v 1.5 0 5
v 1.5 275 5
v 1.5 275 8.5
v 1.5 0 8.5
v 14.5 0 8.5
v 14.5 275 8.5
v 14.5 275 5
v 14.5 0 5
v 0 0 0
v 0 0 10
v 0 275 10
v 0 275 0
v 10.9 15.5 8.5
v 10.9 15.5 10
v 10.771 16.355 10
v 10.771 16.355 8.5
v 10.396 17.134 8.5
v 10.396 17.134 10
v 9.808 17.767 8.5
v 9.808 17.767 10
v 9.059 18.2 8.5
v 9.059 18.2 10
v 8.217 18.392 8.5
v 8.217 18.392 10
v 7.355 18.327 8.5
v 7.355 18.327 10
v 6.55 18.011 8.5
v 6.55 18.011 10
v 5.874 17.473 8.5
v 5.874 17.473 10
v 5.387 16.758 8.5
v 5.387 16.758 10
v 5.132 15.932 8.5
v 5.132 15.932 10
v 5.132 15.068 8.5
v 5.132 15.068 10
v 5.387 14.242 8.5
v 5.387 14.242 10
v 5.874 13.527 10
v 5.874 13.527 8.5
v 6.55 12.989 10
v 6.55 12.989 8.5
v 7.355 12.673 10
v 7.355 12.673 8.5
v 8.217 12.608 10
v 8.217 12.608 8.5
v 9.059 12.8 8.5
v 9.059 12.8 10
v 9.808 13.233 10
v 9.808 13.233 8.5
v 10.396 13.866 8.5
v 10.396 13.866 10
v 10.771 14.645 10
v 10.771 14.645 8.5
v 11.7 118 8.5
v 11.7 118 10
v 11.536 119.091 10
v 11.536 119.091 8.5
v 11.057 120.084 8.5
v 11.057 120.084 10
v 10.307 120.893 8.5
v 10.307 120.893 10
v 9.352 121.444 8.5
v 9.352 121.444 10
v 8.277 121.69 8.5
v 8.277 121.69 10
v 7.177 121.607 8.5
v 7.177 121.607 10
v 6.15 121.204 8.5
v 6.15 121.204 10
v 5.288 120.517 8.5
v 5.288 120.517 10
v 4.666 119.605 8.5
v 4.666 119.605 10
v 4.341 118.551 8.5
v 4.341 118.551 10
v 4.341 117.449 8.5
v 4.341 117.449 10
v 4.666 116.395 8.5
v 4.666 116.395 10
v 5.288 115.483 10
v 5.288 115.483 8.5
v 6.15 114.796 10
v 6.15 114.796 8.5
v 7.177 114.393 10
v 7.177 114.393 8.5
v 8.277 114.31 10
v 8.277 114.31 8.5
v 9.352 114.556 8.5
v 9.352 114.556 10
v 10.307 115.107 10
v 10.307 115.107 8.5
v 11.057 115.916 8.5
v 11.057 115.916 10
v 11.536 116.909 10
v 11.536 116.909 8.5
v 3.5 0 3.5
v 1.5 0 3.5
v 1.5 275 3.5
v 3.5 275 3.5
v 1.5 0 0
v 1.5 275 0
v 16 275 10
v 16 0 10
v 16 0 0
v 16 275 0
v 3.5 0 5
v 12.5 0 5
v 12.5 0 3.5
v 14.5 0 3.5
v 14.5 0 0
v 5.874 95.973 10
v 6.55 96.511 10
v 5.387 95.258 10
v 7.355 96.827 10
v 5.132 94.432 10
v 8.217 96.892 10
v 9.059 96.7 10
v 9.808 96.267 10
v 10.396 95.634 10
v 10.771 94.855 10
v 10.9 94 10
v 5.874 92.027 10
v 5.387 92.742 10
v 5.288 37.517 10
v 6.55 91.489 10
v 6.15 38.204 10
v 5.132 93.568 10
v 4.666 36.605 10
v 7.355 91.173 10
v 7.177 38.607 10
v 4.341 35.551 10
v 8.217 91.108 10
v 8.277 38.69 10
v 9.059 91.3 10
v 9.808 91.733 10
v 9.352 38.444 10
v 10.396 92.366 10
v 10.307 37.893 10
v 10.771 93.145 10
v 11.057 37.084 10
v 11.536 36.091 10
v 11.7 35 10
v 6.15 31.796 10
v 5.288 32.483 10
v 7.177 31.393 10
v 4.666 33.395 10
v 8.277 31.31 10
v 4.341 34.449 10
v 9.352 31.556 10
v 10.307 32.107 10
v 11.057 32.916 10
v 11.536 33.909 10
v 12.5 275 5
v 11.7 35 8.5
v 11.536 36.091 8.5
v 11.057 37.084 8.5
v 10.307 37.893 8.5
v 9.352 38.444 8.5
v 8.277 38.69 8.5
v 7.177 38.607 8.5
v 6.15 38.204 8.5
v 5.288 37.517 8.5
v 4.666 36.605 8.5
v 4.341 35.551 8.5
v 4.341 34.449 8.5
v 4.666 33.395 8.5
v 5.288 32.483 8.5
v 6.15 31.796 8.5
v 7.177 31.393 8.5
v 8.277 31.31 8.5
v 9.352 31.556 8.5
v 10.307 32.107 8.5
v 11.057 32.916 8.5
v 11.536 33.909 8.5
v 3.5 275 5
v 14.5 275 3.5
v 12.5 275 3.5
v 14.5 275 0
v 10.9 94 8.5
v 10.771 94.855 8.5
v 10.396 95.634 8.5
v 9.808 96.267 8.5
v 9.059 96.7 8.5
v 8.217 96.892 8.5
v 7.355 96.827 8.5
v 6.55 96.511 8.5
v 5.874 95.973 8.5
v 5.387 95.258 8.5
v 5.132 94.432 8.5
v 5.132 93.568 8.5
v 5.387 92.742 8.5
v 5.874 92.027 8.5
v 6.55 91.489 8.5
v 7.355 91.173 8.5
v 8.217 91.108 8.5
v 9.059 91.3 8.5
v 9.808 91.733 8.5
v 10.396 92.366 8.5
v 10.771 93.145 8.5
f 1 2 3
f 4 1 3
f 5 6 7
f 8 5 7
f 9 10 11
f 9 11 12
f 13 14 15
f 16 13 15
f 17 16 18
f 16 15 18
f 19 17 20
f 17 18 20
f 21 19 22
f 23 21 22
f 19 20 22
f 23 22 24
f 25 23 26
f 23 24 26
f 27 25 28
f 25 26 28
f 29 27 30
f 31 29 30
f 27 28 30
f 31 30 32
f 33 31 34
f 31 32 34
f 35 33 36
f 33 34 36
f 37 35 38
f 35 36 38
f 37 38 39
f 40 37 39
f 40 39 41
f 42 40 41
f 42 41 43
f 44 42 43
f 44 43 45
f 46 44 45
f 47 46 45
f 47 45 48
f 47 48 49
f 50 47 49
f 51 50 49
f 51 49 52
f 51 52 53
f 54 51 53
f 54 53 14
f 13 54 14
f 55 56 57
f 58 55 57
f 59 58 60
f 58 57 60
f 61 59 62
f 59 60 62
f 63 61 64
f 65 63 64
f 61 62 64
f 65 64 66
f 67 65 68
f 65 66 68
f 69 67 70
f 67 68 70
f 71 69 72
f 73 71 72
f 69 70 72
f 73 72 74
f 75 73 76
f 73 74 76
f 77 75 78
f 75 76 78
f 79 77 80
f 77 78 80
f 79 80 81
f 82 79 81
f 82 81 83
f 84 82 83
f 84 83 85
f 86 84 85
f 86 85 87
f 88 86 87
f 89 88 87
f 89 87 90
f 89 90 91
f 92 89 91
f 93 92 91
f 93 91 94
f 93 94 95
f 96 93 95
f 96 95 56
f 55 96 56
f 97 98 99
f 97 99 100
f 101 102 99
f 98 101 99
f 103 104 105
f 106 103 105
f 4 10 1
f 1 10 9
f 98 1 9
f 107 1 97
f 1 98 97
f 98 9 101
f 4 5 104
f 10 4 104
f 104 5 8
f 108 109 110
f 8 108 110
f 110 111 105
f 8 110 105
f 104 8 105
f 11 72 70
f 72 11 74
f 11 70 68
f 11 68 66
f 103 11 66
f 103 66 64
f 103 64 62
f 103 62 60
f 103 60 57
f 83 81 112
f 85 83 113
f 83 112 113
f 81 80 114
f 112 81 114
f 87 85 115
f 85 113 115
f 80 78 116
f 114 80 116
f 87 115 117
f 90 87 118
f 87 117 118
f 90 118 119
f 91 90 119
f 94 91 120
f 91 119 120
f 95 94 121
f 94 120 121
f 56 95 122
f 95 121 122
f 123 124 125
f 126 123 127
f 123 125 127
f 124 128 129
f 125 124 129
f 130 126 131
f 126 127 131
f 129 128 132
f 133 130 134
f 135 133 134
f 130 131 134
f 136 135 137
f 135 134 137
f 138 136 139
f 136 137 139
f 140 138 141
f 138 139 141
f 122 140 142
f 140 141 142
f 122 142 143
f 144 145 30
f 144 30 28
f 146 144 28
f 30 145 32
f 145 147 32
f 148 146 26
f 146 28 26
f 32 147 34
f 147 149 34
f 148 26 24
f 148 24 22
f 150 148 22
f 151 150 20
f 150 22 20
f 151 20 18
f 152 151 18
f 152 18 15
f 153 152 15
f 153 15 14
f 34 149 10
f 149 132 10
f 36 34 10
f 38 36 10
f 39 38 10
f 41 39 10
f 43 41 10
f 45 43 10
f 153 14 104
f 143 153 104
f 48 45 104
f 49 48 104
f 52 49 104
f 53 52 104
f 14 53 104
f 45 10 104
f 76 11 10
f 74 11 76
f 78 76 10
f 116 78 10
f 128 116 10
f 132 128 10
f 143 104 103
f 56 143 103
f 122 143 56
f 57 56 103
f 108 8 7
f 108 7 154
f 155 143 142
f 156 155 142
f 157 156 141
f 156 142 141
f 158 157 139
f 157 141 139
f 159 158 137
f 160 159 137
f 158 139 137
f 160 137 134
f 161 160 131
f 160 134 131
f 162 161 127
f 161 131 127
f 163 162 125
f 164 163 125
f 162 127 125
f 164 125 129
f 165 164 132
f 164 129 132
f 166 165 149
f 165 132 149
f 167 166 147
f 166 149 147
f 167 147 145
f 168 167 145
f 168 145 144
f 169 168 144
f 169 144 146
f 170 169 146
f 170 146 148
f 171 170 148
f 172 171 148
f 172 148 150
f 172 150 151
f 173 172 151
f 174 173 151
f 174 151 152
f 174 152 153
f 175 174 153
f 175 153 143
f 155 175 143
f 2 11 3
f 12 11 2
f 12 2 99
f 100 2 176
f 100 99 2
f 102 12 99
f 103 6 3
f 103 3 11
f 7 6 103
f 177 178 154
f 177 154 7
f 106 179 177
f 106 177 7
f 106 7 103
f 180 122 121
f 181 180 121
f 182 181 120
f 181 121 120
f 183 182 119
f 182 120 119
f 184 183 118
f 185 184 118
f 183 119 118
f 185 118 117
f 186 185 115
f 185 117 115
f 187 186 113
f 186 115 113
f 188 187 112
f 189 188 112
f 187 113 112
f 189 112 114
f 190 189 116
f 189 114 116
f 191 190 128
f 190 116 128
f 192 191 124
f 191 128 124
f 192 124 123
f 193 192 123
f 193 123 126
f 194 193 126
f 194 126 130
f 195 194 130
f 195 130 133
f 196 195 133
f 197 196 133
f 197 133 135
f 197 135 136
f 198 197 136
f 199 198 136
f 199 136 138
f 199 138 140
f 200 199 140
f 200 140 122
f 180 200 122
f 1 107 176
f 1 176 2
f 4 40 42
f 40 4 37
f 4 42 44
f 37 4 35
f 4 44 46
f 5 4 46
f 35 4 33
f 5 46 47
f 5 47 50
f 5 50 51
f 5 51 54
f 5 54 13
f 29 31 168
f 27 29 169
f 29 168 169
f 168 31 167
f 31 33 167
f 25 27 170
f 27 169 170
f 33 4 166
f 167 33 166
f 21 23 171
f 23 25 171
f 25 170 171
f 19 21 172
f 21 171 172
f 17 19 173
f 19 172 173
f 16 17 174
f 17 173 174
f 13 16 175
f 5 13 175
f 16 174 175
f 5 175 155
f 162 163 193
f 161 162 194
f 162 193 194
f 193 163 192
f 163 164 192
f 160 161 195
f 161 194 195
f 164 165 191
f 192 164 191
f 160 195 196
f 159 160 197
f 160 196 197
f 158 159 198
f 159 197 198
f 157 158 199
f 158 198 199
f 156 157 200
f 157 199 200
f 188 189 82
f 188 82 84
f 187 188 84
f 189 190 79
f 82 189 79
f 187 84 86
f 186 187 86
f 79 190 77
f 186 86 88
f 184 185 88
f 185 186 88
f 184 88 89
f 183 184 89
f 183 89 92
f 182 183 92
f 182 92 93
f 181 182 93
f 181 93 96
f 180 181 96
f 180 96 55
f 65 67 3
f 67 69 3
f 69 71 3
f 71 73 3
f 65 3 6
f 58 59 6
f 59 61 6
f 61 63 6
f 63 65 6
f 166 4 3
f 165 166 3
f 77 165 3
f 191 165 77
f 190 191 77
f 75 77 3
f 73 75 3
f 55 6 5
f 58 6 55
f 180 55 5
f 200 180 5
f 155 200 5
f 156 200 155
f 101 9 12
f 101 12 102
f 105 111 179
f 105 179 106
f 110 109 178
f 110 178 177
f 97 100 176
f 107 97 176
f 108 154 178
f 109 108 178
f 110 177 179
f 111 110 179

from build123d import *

# Parameters (mm, degrees)
SKETCH1_W           = 16
SKETCH1_H           = 10
BOSS_EXTRUDE1_DEPTH = 275
CUT_EXTRUDE1_DEPTH  = 275
SKETCH3_R           = 2.9
SKETCH3_R_2         = 3.7
CUT_EXTRUDE2_DEPTH  = 276.646512766


with BuildPart() as part:
    # Sketch1 → Boss-Extrude1 (new body)
    with BuildSketch(Plane(origin=(0, 0, 0), x_dir=(1, 0, 0), z_dir=(0, 1, 0))):
        with Locations((8, -5)):
            Rectangle(SKETCH1_W, SKETCH1_H)
    extrude(amount=BOSS_EXTRUDE1_DEPTH)

    # Sketch2 → Cut-Extrude1 (cut)
    with BuildSketch(Plane(origin=(0, 275, 0), x_dir=(1, 0, 0), z_dir=(0, 1, 0))):
        Polygon((1.5, 0), (1.5, -3.5), (3.5, -3.5), (3.5, -5), (1.5, -5), (1.5, -8.5), (14.5, -8.5), (14.5, -5), (12.5, -5), (12.5, -3.5), (14.5, -3.5), (14.5, 0), align=None)
    extrude(amount=-CUT_EXTRUDE1_DEPTH, mode=Mode.SUBTRACT)

    # Sketch3 → Cut-Extrude2 (cut, through all)
    with BuildSketch(Plane.XY.offset(10)):
        with Locations((8, 15.5)):
            Circle(SKETCH3_R)
        with Locations((8, 35)):
            Circle(SKETCH3_R_2)
        with Locations((8, 94)):
            Circle(SKETCH3_R)
        with Locations((8, 118)):
            Circle(SKETCH3_R_2)
    extrude(amount=-CUT_EXTRUDE2_DEPTH, mode=Mode.SUBTRACT)


solid = part.part
